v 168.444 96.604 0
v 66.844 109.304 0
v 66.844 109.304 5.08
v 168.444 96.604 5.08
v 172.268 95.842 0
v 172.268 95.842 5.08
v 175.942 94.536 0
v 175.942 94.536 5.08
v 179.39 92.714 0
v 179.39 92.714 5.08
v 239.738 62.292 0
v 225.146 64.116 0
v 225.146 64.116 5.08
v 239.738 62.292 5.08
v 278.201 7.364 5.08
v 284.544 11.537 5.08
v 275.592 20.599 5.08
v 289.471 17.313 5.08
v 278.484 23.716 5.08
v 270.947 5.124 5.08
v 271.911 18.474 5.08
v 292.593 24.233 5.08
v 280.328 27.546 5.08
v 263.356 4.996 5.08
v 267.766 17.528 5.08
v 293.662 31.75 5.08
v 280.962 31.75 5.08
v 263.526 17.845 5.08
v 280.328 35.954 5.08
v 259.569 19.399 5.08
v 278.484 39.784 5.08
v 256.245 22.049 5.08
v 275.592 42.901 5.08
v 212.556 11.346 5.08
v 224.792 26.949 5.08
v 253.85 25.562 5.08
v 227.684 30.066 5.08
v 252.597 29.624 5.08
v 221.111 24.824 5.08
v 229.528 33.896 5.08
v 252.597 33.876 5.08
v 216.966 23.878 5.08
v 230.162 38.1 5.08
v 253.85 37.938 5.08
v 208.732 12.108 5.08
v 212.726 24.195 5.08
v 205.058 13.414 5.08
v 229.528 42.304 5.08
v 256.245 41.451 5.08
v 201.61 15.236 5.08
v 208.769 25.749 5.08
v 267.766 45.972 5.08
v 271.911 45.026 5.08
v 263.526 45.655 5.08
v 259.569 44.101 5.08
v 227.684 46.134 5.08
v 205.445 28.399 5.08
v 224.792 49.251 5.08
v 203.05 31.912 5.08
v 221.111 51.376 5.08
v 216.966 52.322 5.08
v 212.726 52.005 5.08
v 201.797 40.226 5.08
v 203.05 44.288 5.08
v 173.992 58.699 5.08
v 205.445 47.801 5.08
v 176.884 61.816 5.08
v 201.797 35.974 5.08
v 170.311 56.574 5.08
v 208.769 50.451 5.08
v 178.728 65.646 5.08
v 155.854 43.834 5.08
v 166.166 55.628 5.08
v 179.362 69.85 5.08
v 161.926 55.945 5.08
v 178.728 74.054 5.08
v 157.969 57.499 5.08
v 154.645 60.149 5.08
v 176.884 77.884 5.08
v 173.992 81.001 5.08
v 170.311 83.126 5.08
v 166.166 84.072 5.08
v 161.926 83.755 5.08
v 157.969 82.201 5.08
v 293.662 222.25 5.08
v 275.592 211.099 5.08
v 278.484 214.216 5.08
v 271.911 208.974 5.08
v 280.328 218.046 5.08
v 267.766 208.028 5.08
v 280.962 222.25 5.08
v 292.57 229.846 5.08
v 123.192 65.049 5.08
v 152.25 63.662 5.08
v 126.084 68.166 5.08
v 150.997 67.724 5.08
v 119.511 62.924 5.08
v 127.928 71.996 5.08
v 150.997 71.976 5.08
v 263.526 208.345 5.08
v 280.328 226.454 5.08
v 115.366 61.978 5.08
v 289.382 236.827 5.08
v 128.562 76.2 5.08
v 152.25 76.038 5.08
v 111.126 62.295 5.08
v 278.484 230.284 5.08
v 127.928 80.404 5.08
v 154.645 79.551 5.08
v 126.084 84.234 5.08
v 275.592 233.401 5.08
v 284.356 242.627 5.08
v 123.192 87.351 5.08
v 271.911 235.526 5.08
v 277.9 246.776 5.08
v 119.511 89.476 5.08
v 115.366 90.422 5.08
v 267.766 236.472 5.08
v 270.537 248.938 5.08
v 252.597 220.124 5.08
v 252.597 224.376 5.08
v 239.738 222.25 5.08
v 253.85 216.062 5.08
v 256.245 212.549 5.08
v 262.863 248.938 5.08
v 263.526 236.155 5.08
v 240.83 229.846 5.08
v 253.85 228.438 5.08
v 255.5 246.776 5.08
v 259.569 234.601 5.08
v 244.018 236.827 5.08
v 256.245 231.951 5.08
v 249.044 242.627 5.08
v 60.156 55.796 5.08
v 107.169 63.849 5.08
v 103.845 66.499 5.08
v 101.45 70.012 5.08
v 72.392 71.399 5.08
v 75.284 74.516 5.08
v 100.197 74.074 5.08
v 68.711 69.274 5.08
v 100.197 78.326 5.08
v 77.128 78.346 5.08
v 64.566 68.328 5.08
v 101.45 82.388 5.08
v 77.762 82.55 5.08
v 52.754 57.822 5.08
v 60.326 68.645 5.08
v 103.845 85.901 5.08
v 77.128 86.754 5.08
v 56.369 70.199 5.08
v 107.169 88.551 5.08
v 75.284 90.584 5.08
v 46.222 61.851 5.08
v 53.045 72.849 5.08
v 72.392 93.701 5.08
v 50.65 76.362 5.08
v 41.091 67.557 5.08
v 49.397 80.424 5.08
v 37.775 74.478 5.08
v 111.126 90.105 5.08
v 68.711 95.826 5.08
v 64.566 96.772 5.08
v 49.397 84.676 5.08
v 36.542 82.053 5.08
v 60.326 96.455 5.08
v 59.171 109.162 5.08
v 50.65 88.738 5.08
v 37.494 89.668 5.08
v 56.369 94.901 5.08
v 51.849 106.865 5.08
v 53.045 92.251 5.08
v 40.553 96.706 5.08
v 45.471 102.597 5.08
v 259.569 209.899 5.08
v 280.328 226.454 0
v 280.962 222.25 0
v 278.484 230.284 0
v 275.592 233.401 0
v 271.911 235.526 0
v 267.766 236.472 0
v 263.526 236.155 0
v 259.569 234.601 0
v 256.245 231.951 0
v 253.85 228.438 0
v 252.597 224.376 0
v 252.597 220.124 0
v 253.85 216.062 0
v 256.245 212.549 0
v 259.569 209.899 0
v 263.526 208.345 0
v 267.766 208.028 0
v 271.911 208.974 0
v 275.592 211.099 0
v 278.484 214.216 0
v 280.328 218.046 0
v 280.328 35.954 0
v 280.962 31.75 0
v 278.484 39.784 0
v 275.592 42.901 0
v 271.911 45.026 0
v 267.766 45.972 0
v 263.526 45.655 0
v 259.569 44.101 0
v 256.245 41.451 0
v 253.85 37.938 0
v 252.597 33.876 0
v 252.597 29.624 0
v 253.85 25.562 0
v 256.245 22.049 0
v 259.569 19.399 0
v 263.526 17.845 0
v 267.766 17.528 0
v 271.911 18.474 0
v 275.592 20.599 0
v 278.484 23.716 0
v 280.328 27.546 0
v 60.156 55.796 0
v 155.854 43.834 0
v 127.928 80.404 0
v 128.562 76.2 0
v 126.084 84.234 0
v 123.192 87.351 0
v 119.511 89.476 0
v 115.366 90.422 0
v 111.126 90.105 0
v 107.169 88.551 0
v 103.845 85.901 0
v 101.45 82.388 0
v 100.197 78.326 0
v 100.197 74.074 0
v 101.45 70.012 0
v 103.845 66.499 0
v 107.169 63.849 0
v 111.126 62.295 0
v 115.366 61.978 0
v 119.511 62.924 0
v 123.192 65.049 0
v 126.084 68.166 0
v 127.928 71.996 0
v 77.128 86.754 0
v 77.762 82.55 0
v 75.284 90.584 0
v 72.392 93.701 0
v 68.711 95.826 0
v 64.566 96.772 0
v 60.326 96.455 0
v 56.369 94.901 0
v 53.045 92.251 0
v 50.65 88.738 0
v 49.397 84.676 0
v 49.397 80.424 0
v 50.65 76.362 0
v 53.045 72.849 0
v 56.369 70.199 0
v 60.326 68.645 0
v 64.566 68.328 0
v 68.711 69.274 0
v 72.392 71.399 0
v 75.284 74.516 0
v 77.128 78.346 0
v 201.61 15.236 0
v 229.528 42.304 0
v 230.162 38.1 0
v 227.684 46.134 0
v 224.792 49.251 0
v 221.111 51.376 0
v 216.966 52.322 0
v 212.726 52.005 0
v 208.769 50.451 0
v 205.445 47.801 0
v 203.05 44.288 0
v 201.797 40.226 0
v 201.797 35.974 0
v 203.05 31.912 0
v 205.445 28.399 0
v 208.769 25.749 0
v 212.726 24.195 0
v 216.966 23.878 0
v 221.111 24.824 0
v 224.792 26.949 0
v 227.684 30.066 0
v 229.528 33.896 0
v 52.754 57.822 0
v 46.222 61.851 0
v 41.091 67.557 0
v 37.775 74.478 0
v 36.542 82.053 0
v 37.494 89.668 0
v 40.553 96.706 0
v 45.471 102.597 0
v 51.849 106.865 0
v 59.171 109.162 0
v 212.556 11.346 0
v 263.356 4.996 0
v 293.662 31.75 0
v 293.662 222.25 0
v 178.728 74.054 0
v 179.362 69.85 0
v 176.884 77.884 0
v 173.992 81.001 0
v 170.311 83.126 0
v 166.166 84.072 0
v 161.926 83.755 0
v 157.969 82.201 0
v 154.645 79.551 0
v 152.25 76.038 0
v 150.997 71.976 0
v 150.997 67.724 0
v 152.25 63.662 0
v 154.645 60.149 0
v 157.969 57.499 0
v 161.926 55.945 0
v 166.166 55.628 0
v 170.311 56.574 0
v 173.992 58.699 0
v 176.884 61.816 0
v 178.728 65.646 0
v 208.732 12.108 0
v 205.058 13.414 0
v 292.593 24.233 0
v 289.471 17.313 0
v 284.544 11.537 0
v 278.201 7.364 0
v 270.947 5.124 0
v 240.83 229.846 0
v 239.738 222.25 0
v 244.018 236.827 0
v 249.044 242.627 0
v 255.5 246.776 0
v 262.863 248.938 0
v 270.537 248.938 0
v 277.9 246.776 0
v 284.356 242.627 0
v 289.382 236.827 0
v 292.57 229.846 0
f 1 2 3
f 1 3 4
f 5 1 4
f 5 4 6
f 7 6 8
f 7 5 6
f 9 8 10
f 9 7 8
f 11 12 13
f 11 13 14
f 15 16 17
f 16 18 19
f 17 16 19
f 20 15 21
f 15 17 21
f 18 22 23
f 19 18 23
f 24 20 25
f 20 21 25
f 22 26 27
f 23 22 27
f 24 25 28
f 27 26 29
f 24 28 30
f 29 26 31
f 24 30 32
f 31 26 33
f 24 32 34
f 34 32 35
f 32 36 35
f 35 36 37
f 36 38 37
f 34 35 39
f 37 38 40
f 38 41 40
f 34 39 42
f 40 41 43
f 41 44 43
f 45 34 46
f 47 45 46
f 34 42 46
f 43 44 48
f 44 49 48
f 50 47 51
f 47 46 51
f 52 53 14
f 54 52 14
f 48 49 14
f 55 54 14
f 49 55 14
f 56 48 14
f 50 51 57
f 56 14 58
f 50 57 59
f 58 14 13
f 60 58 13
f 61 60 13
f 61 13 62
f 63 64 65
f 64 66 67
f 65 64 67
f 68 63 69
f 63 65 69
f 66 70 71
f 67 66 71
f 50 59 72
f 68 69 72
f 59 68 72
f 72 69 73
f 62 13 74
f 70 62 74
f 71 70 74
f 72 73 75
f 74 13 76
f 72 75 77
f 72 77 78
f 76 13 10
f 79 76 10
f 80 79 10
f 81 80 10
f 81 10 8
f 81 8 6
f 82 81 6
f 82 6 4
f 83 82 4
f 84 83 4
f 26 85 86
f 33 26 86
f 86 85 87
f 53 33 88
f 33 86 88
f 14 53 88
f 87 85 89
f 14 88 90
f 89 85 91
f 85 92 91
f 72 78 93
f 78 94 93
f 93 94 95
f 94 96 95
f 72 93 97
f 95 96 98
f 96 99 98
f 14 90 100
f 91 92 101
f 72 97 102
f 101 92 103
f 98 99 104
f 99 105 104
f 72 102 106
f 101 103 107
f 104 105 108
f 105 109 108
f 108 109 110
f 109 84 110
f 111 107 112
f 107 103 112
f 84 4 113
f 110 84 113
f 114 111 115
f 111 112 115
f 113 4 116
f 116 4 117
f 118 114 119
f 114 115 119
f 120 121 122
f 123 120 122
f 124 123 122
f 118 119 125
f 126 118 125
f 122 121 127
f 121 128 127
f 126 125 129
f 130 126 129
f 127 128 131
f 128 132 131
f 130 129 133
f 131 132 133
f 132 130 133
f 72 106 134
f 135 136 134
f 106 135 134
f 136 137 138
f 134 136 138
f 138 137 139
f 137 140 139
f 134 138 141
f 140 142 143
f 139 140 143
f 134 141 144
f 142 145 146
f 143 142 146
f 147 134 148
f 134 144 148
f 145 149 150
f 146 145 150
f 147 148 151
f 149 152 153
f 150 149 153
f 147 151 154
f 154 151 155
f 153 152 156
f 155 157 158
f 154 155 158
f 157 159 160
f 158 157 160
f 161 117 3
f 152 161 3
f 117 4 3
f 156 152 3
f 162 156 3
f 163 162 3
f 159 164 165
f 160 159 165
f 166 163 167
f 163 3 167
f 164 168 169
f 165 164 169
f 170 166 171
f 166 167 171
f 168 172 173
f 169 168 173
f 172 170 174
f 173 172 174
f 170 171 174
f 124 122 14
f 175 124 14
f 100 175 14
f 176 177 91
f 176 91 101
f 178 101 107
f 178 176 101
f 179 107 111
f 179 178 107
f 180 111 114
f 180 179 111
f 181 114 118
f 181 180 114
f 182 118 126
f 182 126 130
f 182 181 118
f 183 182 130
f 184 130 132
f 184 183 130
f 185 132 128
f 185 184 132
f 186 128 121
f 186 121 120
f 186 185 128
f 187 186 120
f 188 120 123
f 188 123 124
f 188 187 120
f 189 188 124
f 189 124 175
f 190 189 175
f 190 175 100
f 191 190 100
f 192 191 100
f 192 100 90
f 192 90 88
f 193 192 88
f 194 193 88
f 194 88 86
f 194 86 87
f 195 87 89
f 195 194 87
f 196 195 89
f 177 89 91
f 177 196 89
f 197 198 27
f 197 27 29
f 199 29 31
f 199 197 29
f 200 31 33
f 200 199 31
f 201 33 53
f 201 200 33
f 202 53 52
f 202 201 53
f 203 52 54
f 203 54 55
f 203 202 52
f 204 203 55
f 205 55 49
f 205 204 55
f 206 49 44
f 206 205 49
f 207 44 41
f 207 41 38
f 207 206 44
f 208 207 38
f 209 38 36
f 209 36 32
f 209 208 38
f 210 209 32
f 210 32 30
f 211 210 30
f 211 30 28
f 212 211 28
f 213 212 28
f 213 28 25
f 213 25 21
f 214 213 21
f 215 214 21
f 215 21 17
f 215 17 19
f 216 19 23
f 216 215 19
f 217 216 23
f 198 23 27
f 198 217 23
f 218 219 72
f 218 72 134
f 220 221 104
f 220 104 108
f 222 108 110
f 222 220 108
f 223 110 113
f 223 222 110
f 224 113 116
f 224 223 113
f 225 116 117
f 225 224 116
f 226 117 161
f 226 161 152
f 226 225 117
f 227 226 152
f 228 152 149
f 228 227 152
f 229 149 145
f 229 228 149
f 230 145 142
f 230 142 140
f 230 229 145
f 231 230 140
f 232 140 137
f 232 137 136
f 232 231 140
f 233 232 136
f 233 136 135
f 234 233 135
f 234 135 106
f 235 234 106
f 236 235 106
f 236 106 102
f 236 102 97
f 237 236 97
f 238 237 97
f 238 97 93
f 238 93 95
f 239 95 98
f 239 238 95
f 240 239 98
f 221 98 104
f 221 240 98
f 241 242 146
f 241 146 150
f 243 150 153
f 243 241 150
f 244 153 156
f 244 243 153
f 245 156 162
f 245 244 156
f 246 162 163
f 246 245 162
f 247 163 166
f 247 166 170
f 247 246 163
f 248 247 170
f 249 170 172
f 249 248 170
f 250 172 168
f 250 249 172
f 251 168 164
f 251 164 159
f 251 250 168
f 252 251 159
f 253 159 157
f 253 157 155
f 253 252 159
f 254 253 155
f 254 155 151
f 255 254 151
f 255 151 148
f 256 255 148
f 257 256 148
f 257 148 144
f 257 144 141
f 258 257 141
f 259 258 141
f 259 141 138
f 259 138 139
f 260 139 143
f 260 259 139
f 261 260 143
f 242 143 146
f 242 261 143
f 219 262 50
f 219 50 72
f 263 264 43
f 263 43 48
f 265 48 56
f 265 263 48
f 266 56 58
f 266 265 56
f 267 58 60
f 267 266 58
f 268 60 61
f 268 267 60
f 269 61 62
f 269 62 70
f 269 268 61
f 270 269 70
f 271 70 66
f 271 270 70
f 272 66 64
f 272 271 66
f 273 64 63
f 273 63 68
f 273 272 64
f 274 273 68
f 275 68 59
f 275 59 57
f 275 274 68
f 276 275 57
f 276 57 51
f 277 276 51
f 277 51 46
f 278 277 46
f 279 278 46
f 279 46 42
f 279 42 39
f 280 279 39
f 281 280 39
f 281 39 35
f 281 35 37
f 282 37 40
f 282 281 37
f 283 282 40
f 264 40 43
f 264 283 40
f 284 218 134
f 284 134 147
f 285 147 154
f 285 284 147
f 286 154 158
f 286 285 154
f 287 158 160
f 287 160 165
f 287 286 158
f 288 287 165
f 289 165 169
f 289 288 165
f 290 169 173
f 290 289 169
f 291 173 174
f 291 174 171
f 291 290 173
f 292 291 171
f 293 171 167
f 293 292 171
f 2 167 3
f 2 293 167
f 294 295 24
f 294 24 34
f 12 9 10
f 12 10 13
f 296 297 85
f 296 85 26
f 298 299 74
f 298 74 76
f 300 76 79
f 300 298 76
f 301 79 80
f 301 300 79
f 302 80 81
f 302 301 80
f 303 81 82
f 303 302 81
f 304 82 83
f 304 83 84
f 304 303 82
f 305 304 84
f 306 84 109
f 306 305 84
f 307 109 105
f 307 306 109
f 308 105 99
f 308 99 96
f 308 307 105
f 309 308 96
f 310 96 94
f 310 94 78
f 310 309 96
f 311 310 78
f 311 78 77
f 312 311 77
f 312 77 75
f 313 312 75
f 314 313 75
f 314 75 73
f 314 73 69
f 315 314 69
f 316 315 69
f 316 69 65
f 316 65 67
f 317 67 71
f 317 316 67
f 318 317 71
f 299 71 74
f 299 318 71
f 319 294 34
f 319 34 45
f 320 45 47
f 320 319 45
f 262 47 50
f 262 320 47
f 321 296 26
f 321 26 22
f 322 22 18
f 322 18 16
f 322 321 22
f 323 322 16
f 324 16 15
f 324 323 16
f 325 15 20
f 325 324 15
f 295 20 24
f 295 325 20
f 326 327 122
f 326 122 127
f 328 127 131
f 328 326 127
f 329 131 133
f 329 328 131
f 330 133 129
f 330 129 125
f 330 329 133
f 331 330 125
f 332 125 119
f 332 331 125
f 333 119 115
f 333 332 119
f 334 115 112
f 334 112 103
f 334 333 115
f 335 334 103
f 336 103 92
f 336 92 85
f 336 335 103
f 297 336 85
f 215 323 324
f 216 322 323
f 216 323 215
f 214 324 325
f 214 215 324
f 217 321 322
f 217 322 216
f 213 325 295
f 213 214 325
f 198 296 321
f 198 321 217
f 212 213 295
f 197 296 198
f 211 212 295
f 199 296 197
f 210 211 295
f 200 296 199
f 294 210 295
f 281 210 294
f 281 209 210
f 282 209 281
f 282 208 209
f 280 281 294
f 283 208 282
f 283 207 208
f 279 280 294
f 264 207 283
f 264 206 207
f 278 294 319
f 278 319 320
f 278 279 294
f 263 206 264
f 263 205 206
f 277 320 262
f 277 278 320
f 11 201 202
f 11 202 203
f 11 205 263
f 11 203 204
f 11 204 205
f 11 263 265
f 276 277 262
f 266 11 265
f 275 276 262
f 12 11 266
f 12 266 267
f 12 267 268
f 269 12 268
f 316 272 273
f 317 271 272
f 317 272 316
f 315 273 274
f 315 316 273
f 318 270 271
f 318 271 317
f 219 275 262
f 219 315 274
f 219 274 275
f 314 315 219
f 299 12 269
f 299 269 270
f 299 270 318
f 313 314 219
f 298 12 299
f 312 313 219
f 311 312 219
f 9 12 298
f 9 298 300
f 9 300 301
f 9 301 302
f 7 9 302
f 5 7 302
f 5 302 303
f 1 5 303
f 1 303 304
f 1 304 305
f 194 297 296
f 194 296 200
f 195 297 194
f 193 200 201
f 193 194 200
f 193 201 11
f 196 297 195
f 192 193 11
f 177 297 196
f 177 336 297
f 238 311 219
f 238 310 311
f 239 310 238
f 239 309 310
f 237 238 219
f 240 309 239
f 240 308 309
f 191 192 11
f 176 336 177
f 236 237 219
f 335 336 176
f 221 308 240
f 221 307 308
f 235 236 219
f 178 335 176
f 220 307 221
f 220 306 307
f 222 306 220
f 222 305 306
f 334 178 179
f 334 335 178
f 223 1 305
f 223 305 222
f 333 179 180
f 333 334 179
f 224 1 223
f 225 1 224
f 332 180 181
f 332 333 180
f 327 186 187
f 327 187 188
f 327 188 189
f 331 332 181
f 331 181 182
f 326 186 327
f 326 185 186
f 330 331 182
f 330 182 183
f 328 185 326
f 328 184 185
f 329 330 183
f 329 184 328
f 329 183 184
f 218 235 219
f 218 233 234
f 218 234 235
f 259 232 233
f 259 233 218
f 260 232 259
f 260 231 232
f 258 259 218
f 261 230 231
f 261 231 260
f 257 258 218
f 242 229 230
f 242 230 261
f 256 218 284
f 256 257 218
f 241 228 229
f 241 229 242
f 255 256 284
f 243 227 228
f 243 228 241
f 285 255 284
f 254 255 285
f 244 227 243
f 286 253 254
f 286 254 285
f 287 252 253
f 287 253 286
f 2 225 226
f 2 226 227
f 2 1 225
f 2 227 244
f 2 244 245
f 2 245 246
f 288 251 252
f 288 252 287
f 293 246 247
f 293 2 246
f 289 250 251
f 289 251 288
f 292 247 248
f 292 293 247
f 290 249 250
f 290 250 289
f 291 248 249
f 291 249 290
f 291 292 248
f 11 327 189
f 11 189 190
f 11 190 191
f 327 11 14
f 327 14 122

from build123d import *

# Parameters (mm, degrees)
MODEL_R             = 14.2621
BOSS_EXTRUDE1_DEPTH = 5.08


with BuildPart() as part:
    # Model → Boss-Extrude1 (new body)
    with BuildSketch(Plane.XY):
        with BuildLine():
            Line((293.6621, 222.25), (293.6621, 31.75))
            ThreePointArc((293.6621, 31.75), (284.54358689, 11.537102056), (263.355763082, 4.996104661))
            Line((263.355763082, 4.996104661), (212.555763082, 11.346104661))
            ThreePointArc((212.555763082, 11.346104661), (206.870950218, 12.694664017), (201.61011558, 15.236184928))
            Line((201.61011558, 15.236184928), (155.853864238, 43.833842015))
            Line((155.853864238, 43.833842015), (60.155763082, 55.796104661))
            ThreePointArc((60.155763082, 55.796104661), (36.746104661, 85.894236918), (66.844236918, 109.303895339))
            Line((66.844236918, 109.303895339), (168.444236918, 96.603895339))
            ThreePointArc((168.444236918, 96.603895339), (174.129049782, 95.255335983), (179.38988442, 92.713815072))
            Line((179.38988442, 92.713815072), (225.146135762, 64.116157985))
            Line((225.146135762, 64.116157985), (239.7379, 62.292187455))
            Line((239.7379, 62.292187455), (239.7379, 222.25))
            ThreePointArc((239.7379, 222.25), (266.7, 249.2121), (293.6621, 222.25))
        make_face()
        with Locations((63.5, 82.55)):
            Circle(MODEL_R, mode=Mode.SUBTRACT)
        with Locations((114.3, 76.2)):
            Circle(MODEL_R, mode=Mode.SUBTRACT)
        with Locations((165.1, 69.85)):
            Circle(MODEL_R, mode=Mode.SUBTRACT)
        with Locations((215.9, 38.1)):
            Circle(MODEL_R, mode=Mode.SUBTRACT)
        with Locations((266.7, 222.25)):
            Circle(MODEL_R, mode=Mode.SUBTRACT)
        with Locations((266.7, 31.75)):
            Circle(MODEL_R, mode=Mode.SUBTRACT)
    extrude(amount=BOSS_EXTRUDE1_DEPTH)


solid = part.part
